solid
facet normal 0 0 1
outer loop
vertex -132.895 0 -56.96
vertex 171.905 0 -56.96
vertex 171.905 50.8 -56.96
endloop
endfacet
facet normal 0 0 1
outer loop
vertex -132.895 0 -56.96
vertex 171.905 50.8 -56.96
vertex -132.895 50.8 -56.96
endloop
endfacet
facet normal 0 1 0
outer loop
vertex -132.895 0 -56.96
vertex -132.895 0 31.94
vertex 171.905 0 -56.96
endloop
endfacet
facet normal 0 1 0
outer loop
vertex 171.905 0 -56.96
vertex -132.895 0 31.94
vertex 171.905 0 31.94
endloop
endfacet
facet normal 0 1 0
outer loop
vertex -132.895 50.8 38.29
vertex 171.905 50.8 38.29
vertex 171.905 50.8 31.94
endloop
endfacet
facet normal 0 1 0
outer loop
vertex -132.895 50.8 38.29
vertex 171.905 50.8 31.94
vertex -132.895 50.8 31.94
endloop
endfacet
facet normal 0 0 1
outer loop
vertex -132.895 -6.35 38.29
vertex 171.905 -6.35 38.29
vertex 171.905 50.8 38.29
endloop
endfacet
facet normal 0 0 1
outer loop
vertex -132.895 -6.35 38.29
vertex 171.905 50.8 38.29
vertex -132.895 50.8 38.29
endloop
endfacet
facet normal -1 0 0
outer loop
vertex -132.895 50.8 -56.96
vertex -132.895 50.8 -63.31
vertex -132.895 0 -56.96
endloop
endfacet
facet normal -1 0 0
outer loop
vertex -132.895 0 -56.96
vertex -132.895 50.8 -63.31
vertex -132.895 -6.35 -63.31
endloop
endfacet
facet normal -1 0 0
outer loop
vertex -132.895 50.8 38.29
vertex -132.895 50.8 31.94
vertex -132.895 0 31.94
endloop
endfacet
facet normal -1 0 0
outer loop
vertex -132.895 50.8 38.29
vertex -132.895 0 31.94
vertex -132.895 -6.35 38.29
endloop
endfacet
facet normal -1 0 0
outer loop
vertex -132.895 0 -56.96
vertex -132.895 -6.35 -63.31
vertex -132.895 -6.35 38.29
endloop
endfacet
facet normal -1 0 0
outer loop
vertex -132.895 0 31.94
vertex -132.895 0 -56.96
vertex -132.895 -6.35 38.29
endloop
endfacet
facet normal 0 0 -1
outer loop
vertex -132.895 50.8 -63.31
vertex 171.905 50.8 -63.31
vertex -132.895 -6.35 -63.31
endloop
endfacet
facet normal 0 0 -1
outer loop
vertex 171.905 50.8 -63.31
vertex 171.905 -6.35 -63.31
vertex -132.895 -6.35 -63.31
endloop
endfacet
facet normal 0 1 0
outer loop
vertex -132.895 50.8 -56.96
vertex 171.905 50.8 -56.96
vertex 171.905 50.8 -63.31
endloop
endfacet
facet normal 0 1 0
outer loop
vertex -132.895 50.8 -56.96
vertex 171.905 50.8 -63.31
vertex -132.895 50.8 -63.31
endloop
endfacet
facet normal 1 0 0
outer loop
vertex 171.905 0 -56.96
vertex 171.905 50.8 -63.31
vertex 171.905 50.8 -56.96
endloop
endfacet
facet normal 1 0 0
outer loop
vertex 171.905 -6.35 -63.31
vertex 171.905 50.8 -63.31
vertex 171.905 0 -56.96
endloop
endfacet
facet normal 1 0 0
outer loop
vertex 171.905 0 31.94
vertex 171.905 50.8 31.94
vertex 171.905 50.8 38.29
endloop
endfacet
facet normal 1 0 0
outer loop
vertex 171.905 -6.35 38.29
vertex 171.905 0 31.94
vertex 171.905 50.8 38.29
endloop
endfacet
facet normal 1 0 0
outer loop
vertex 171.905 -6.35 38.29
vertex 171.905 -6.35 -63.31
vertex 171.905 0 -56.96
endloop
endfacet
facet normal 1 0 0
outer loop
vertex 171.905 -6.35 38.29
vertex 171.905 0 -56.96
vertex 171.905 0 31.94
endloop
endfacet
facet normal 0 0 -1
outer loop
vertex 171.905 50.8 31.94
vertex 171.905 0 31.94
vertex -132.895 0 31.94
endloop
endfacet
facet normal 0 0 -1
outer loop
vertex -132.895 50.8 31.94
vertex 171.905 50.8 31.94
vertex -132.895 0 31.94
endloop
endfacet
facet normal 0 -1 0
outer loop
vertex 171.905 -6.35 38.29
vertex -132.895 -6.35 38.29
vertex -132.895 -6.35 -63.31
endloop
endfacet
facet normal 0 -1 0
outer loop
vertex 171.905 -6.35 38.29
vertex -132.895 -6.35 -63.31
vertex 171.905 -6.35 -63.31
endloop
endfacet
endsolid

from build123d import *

# Parameters (mm, degrees)
F0_W     = 304.8
F0_H     = 101.6
F1_DEPTH = 6.35
F2_W     = 304.8
F2_H     = 6.35
F3_DEPTH = 50.8
F4_DEPTH = 50.8


with BuildPart() as f1:
    # F0 (on Front) → F1 (new body)
    with BuildSketch(Plane.XZ):
        with Locations((19.505125, -12.510431)):
            Rectangle(F0_W, F0_H)
    extrude(amount=F1_DEPTH)

    # F2 (on face) → F3 (join)
    with BuildSketch(Plane(origin=(0, 0, 0), x_dir=(-1, 0, 0), z_dir=(0, 1, 0))):
        with Locations((-19.505125, 35.114569)):
            Rectangle(F2_W, F2_H)
    extrude(amount=F3_DEPTH)

    # F2 (on face) → F4 (join)
    with BuildSketch(Plane(origin=(0, 0, 0), x_dir=(-1, 0, 0), z_dir=(0, 1, 0))):
        with Locations((-19.505125, -60.135431)):
            Rectangle(F2_W, F2_H)
    extrude(amount=F4_DEPTH)


solid = f1.part
